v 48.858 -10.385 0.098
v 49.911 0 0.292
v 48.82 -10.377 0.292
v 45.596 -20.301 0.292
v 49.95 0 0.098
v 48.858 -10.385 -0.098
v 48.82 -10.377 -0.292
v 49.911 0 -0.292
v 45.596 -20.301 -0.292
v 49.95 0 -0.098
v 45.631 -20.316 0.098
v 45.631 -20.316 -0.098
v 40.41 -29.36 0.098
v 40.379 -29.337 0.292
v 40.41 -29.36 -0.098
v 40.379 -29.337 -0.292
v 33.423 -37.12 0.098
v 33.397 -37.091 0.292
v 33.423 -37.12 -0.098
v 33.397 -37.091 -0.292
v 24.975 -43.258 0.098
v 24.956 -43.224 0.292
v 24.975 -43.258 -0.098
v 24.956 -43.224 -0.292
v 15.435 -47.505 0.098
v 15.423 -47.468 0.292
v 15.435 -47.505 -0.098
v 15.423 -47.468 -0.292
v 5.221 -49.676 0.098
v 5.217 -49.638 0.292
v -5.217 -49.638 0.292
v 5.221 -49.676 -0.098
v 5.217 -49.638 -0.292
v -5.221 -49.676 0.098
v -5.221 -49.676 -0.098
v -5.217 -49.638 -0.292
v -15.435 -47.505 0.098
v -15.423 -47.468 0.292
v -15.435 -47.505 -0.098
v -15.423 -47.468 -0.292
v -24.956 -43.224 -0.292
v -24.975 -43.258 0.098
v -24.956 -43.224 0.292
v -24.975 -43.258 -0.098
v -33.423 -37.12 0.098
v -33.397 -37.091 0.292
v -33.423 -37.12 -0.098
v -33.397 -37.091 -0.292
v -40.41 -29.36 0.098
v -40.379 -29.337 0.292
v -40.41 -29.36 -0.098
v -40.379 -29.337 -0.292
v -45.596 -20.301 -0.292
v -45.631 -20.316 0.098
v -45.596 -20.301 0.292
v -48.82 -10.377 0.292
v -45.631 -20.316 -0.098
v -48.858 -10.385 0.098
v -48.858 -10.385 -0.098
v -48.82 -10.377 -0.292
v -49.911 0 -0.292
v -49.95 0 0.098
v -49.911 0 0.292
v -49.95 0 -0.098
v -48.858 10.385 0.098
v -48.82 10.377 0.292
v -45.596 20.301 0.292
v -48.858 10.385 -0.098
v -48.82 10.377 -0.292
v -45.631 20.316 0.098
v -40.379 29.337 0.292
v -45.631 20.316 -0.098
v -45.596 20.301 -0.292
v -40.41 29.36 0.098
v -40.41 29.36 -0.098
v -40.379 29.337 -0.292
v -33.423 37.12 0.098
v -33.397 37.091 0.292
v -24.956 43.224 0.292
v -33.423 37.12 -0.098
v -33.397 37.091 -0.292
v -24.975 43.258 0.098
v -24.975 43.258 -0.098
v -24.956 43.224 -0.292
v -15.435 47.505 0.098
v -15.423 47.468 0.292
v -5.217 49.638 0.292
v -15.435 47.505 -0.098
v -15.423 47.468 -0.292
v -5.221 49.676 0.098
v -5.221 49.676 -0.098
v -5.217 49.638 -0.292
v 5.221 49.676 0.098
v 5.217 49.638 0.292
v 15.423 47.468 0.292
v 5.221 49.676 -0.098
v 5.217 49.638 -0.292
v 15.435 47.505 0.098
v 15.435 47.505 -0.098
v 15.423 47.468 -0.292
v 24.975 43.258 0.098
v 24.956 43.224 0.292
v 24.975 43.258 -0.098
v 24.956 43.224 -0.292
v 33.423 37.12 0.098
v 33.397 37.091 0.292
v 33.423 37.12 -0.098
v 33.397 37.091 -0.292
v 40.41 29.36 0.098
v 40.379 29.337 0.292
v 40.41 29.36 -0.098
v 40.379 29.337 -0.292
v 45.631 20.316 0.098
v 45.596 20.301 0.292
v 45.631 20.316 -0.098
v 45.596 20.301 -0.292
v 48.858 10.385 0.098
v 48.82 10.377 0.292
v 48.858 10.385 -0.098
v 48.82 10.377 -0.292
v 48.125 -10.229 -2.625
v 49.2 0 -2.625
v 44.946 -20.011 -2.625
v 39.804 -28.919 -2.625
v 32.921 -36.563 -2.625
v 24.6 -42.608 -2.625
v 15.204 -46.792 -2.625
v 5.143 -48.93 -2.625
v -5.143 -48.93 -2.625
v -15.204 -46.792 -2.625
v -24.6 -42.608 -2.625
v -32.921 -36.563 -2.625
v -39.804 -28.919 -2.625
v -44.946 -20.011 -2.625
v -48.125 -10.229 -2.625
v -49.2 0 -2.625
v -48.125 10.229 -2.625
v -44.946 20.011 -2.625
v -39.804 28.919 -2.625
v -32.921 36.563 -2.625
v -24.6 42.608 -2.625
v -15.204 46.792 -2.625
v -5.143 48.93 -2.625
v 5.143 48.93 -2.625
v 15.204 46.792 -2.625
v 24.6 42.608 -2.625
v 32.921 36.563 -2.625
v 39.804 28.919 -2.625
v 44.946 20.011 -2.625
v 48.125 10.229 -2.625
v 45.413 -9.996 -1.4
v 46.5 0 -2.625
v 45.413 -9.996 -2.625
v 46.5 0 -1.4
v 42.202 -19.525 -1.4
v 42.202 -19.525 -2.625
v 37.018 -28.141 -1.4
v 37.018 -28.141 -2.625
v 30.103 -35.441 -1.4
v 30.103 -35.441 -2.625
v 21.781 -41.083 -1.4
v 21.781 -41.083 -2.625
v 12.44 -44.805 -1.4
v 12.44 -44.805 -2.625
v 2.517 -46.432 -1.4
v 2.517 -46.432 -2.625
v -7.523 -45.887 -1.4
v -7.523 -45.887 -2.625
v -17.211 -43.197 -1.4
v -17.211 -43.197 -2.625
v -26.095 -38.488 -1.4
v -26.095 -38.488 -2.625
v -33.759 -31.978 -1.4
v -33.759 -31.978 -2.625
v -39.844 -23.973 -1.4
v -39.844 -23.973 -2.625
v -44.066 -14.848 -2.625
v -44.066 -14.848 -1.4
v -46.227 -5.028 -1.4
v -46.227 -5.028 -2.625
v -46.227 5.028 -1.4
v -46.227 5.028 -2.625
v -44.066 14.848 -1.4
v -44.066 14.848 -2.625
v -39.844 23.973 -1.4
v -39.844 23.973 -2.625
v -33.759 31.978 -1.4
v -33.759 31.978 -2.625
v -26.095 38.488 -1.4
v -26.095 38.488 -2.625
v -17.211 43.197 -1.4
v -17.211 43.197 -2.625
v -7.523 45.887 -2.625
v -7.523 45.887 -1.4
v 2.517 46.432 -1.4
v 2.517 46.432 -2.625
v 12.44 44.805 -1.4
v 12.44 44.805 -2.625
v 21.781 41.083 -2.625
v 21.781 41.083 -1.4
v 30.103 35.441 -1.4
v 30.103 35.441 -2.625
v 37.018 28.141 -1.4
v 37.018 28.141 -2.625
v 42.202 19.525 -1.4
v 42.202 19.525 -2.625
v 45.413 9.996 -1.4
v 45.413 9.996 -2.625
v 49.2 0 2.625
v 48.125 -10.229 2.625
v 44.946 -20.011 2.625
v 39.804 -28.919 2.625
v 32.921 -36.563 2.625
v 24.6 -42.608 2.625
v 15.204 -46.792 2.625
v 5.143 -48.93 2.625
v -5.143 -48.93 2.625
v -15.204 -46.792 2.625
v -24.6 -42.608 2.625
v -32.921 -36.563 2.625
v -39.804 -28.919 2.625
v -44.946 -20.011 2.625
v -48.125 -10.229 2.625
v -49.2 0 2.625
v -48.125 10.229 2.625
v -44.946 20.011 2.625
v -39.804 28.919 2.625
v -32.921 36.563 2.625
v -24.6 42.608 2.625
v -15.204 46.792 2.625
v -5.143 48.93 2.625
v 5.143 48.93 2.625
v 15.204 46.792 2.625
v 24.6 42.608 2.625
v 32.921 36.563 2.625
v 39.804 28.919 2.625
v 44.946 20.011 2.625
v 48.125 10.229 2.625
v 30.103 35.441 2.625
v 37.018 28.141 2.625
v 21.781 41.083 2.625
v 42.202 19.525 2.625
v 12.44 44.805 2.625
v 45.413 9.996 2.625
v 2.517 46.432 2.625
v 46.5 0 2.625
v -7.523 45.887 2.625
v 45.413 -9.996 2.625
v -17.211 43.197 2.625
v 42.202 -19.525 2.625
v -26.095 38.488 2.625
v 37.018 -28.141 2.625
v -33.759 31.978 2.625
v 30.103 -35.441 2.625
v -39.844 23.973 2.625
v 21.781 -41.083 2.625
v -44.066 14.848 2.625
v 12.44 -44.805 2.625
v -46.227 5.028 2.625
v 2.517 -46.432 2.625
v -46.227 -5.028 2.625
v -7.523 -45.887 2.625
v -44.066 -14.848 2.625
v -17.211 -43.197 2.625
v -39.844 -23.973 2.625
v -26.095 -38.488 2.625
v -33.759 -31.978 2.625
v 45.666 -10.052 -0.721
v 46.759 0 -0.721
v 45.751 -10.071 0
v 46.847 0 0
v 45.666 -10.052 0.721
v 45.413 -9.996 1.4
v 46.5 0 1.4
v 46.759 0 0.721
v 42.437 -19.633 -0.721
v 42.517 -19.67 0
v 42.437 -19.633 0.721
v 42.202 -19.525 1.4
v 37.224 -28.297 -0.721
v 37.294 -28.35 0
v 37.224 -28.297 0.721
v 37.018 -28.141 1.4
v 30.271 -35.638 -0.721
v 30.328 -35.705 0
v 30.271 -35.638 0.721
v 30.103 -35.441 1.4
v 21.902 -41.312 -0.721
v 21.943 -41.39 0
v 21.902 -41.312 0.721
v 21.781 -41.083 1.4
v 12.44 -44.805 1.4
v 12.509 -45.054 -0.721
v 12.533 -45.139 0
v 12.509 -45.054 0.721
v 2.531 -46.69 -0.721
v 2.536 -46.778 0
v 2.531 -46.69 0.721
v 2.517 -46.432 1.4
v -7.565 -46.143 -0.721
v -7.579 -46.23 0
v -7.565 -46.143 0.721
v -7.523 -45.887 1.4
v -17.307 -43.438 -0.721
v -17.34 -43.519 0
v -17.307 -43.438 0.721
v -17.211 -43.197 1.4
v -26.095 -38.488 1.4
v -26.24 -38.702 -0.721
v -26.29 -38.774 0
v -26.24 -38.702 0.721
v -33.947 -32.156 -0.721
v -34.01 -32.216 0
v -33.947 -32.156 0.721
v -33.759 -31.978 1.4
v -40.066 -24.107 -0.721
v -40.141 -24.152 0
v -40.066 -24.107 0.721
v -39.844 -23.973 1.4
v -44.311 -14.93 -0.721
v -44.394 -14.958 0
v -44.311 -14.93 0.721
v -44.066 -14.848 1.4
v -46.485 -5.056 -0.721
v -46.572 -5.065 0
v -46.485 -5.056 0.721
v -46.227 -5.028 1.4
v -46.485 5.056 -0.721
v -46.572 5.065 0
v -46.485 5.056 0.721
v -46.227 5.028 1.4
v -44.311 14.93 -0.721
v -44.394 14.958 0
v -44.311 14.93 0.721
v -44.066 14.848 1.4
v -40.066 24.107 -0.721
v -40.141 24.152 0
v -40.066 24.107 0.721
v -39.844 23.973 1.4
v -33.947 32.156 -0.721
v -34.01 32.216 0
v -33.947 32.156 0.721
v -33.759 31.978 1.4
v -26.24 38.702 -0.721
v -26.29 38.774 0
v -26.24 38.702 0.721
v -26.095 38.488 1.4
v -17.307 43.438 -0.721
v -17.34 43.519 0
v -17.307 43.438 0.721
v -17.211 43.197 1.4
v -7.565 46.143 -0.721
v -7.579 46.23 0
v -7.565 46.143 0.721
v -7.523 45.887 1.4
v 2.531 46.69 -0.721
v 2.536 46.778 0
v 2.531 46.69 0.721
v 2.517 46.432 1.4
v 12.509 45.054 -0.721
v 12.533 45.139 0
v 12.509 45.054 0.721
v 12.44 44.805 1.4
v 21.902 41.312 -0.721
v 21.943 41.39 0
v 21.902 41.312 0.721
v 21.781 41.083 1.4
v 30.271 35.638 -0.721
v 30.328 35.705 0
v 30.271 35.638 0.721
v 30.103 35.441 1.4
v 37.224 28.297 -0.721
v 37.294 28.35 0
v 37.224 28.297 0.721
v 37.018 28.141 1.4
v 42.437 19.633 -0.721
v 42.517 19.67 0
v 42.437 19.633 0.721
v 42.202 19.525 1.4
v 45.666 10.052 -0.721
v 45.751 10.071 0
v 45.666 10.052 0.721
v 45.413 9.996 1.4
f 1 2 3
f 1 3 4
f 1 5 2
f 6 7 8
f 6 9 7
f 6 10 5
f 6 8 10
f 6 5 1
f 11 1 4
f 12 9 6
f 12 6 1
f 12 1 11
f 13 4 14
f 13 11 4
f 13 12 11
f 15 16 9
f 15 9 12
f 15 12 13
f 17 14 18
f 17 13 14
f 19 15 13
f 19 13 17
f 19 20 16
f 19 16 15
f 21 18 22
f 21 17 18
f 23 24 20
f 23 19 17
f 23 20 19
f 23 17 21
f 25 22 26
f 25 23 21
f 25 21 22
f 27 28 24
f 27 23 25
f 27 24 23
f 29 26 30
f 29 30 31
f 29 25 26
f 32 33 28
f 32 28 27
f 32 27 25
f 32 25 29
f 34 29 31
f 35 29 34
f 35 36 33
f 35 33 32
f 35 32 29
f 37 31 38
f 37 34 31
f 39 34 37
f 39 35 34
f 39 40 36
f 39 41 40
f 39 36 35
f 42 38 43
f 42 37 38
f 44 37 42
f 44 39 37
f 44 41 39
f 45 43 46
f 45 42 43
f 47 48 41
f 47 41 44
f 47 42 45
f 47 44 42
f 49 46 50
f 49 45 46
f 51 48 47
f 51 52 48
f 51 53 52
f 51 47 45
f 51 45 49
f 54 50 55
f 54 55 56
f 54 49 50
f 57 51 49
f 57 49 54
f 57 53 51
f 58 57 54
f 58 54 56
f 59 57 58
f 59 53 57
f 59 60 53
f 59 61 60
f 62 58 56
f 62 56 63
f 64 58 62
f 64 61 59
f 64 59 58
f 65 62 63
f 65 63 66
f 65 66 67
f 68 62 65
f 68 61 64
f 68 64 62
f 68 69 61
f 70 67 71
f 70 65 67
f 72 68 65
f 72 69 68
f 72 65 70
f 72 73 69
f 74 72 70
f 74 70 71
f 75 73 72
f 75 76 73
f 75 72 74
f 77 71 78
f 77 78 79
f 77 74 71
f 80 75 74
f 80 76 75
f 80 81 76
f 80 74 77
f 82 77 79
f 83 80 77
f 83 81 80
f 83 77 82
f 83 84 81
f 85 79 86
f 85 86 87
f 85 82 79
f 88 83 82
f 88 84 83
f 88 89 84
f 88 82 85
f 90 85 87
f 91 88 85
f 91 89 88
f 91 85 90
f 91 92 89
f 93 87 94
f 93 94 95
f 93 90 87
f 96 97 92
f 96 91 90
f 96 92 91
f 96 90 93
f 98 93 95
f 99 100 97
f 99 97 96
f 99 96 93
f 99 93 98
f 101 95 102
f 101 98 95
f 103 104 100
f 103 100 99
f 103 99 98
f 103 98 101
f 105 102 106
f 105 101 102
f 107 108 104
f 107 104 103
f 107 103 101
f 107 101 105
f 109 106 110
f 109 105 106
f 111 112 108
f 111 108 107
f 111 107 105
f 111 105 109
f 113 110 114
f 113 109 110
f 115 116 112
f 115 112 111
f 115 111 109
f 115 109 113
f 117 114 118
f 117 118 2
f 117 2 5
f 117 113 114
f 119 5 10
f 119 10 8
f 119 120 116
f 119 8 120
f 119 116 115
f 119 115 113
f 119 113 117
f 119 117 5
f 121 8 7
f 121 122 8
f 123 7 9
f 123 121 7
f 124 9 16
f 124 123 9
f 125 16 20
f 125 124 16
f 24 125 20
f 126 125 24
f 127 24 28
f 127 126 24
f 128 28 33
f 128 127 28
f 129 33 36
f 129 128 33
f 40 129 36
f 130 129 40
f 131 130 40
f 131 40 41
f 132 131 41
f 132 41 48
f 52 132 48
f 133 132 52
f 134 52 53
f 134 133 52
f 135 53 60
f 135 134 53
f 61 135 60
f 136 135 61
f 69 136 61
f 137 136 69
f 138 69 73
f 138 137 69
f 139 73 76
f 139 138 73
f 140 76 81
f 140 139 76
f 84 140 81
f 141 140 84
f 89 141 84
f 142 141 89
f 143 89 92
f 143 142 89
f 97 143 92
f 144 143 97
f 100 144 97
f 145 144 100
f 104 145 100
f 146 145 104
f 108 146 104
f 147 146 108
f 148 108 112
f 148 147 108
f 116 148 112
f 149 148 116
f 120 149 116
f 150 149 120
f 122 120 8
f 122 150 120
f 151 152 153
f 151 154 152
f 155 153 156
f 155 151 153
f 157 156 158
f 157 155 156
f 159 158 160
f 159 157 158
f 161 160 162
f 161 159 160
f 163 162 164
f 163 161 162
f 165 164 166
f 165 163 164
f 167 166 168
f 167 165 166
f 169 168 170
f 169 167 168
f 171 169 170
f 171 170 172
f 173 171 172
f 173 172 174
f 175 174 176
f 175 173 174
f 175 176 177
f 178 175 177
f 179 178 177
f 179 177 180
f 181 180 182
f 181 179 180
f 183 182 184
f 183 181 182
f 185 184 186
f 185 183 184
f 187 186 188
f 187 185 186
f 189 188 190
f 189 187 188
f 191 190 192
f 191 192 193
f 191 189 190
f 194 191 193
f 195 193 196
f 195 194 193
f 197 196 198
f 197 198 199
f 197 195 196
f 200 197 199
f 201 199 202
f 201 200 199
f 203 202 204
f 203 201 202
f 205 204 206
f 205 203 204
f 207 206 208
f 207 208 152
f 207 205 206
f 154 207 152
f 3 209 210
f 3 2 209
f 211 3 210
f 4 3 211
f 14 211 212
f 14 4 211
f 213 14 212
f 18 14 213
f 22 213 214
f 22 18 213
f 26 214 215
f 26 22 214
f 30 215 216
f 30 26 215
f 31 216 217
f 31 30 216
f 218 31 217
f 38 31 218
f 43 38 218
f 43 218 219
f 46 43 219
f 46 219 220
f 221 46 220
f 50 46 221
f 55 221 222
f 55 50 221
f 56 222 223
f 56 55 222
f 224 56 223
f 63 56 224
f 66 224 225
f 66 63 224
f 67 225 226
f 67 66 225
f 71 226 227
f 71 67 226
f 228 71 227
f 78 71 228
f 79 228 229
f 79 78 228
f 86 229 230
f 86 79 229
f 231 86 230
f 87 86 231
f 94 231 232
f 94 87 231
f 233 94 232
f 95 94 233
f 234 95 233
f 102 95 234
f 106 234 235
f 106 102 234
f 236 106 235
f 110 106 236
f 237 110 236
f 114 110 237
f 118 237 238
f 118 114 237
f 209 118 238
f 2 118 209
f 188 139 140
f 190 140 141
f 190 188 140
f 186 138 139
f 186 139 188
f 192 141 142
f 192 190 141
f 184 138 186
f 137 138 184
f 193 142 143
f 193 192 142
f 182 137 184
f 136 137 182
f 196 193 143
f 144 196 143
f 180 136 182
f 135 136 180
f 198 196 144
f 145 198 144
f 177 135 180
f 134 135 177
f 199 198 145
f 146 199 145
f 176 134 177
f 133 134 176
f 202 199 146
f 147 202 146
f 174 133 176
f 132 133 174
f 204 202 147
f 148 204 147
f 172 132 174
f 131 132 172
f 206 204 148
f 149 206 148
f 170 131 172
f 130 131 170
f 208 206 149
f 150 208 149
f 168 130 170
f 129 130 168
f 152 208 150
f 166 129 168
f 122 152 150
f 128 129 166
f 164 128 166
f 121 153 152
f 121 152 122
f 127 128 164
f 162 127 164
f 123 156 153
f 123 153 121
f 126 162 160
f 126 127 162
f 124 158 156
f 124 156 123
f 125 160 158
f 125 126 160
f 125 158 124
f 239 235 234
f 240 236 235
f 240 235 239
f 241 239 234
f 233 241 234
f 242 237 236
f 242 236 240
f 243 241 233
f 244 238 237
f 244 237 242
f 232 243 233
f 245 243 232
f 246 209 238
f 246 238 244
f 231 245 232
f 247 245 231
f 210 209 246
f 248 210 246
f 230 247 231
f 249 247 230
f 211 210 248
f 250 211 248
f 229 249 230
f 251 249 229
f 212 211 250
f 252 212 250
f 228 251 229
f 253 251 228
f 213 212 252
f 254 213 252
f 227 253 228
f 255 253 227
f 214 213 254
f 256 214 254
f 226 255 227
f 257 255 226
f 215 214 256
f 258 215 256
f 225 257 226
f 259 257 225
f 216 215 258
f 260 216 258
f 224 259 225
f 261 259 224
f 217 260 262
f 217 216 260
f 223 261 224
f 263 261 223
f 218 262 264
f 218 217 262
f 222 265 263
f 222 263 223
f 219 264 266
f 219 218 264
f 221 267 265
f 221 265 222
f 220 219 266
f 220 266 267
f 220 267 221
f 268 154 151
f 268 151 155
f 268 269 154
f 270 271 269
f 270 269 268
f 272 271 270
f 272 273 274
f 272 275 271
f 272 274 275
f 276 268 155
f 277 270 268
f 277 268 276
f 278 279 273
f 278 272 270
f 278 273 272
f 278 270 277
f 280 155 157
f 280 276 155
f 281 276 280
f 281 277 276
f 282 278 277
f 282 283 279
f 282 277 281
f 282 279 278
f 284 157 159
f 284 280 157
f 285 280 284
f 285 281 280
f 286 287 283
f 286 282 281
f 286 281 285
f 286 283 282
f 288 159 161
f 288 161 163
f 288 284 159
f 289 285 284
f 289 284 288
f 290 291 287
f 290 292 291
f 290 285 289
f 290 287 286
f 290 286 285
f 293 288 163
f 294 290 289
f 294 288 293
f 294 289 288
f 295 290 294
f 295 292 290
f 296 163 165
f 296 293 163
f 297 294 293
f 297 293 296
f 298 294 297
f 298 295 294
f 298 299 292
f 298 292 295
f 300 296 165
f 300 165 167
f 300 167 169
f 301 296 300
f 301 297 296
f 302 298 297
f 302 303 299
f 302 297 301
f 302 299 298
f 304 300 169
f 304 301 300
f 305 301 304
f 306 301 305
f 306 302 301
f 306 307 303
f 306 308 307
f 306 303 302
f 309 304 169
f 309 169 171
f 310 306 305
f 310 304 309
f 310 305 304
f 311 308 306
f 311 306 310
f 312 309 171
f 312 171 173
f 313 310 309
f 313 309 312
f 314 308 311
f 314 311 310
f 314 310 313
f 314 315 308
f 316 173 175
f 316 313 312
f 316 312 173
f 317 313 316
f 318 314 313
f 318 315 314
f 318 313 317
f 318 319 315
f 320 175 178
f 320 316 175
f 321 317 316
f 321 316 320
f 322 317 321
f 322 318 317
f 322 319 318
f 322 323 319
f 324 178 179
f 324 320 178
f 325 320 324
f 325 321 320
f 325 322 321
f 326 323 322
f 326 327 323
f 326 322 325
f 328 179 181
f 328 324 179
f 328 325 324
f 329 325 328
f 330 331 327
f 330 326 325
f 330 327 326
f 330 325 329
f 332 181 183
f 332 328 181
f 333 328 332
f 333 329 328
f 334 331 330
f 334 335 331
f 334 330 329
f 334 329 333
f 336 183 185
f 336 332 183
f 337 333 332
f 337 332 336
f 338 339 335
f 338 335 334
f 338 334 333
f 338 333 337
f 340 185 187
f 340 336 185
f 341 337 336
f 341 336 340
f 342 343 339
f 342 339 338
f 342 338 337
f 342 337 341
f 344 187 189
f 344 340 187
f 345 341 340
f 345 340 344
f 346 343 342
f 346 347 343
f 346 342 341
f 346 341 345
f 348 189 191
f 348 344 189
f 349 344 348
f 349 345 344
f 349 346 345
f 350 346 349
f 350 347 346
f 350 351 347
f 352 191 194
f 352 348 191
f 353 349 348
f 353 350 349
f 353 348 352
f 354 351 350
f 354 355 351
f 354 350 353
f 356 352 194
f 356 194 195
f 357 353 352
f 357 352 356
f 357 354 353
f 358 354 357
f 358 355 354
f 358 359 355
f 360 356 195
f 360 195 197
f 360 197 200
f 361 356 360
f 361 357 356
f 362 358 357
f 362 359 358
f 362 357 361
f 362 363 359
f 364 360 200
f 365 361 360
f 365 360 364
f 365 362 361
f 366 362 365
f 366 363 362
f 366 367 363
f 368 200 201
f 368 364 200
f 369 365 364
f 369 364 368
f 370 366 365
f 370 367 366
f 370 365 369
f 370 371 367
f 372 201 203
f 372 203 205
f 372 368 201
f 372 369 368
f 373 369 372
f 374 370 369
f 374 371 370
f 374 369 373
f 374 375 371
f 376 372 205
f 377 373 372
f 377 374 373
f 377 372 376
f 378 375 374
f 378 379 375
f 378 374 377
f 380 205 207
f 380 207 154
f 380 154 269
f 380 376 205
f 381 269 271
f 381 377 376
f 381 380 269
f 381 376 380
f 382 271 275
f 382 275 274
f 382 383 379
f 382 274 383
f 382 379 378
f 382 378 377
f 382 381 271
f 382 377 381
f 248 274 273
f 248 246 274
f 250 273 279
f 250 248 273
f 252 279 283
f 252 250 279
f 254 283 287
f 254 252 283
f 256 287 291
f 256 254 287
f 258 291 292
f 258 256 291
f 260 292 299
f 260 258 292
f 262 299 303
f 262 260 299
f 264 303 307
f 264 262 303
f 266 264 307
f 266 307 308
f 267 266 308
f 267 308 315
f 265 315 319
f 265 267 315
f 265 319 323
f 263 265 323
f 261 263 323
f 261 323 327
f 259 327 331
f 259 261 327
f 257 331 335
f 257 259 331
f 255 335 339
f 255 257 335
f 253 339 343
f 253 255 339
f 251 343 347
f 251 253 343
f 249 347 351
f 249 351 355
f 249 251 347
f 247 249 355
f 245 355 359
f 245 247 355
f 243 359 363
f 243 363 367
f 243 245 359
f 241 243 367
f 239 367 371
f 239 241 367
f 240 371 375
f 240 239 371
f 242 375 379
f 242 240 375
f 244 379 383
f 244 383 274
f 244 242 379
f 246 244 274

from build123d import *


with BuildPart() as part:
    # Sketch1 → Revolve1 (revolve)
    with BuildSketch(Plane(origin=(0, 0, 0), x_dir=(0, 0, -1), z_dir=(1, 0, 0)), mode=Mode.PRIVATE) as revolve1_sk:
        with BuildLine():
            Line((0.291524109, 49.911154557), (2.625, 49.2))
            Line((2.625, 49.2), (2.625, 46.5))
            Line((2.625, 46.5), (1.4, 46.5))
            ThreePointArc((1.4, 46.5), (0, 46.846700168), (-1.4, 46.5))
            Line((-1.4, 46.5), (-2.625, 46.5))
            Line((-2.625, 46.5), (-2.625, 49.2))
            Line((-2.625, 49.2), (-0.291524109, 49.911154557))
            ThreePointArc((-0.291524109, 49.911154557), (0, 49.954591076), (0.291524109, 49.911154557))
        make_face()
    revolve(revolve1_sk.sketch.rotate(Axis((0, 0, 0), (0, 0, -1)), 90), axis=Axis((0, 0, 0), (0, 0, -1)))


solid = part.part
